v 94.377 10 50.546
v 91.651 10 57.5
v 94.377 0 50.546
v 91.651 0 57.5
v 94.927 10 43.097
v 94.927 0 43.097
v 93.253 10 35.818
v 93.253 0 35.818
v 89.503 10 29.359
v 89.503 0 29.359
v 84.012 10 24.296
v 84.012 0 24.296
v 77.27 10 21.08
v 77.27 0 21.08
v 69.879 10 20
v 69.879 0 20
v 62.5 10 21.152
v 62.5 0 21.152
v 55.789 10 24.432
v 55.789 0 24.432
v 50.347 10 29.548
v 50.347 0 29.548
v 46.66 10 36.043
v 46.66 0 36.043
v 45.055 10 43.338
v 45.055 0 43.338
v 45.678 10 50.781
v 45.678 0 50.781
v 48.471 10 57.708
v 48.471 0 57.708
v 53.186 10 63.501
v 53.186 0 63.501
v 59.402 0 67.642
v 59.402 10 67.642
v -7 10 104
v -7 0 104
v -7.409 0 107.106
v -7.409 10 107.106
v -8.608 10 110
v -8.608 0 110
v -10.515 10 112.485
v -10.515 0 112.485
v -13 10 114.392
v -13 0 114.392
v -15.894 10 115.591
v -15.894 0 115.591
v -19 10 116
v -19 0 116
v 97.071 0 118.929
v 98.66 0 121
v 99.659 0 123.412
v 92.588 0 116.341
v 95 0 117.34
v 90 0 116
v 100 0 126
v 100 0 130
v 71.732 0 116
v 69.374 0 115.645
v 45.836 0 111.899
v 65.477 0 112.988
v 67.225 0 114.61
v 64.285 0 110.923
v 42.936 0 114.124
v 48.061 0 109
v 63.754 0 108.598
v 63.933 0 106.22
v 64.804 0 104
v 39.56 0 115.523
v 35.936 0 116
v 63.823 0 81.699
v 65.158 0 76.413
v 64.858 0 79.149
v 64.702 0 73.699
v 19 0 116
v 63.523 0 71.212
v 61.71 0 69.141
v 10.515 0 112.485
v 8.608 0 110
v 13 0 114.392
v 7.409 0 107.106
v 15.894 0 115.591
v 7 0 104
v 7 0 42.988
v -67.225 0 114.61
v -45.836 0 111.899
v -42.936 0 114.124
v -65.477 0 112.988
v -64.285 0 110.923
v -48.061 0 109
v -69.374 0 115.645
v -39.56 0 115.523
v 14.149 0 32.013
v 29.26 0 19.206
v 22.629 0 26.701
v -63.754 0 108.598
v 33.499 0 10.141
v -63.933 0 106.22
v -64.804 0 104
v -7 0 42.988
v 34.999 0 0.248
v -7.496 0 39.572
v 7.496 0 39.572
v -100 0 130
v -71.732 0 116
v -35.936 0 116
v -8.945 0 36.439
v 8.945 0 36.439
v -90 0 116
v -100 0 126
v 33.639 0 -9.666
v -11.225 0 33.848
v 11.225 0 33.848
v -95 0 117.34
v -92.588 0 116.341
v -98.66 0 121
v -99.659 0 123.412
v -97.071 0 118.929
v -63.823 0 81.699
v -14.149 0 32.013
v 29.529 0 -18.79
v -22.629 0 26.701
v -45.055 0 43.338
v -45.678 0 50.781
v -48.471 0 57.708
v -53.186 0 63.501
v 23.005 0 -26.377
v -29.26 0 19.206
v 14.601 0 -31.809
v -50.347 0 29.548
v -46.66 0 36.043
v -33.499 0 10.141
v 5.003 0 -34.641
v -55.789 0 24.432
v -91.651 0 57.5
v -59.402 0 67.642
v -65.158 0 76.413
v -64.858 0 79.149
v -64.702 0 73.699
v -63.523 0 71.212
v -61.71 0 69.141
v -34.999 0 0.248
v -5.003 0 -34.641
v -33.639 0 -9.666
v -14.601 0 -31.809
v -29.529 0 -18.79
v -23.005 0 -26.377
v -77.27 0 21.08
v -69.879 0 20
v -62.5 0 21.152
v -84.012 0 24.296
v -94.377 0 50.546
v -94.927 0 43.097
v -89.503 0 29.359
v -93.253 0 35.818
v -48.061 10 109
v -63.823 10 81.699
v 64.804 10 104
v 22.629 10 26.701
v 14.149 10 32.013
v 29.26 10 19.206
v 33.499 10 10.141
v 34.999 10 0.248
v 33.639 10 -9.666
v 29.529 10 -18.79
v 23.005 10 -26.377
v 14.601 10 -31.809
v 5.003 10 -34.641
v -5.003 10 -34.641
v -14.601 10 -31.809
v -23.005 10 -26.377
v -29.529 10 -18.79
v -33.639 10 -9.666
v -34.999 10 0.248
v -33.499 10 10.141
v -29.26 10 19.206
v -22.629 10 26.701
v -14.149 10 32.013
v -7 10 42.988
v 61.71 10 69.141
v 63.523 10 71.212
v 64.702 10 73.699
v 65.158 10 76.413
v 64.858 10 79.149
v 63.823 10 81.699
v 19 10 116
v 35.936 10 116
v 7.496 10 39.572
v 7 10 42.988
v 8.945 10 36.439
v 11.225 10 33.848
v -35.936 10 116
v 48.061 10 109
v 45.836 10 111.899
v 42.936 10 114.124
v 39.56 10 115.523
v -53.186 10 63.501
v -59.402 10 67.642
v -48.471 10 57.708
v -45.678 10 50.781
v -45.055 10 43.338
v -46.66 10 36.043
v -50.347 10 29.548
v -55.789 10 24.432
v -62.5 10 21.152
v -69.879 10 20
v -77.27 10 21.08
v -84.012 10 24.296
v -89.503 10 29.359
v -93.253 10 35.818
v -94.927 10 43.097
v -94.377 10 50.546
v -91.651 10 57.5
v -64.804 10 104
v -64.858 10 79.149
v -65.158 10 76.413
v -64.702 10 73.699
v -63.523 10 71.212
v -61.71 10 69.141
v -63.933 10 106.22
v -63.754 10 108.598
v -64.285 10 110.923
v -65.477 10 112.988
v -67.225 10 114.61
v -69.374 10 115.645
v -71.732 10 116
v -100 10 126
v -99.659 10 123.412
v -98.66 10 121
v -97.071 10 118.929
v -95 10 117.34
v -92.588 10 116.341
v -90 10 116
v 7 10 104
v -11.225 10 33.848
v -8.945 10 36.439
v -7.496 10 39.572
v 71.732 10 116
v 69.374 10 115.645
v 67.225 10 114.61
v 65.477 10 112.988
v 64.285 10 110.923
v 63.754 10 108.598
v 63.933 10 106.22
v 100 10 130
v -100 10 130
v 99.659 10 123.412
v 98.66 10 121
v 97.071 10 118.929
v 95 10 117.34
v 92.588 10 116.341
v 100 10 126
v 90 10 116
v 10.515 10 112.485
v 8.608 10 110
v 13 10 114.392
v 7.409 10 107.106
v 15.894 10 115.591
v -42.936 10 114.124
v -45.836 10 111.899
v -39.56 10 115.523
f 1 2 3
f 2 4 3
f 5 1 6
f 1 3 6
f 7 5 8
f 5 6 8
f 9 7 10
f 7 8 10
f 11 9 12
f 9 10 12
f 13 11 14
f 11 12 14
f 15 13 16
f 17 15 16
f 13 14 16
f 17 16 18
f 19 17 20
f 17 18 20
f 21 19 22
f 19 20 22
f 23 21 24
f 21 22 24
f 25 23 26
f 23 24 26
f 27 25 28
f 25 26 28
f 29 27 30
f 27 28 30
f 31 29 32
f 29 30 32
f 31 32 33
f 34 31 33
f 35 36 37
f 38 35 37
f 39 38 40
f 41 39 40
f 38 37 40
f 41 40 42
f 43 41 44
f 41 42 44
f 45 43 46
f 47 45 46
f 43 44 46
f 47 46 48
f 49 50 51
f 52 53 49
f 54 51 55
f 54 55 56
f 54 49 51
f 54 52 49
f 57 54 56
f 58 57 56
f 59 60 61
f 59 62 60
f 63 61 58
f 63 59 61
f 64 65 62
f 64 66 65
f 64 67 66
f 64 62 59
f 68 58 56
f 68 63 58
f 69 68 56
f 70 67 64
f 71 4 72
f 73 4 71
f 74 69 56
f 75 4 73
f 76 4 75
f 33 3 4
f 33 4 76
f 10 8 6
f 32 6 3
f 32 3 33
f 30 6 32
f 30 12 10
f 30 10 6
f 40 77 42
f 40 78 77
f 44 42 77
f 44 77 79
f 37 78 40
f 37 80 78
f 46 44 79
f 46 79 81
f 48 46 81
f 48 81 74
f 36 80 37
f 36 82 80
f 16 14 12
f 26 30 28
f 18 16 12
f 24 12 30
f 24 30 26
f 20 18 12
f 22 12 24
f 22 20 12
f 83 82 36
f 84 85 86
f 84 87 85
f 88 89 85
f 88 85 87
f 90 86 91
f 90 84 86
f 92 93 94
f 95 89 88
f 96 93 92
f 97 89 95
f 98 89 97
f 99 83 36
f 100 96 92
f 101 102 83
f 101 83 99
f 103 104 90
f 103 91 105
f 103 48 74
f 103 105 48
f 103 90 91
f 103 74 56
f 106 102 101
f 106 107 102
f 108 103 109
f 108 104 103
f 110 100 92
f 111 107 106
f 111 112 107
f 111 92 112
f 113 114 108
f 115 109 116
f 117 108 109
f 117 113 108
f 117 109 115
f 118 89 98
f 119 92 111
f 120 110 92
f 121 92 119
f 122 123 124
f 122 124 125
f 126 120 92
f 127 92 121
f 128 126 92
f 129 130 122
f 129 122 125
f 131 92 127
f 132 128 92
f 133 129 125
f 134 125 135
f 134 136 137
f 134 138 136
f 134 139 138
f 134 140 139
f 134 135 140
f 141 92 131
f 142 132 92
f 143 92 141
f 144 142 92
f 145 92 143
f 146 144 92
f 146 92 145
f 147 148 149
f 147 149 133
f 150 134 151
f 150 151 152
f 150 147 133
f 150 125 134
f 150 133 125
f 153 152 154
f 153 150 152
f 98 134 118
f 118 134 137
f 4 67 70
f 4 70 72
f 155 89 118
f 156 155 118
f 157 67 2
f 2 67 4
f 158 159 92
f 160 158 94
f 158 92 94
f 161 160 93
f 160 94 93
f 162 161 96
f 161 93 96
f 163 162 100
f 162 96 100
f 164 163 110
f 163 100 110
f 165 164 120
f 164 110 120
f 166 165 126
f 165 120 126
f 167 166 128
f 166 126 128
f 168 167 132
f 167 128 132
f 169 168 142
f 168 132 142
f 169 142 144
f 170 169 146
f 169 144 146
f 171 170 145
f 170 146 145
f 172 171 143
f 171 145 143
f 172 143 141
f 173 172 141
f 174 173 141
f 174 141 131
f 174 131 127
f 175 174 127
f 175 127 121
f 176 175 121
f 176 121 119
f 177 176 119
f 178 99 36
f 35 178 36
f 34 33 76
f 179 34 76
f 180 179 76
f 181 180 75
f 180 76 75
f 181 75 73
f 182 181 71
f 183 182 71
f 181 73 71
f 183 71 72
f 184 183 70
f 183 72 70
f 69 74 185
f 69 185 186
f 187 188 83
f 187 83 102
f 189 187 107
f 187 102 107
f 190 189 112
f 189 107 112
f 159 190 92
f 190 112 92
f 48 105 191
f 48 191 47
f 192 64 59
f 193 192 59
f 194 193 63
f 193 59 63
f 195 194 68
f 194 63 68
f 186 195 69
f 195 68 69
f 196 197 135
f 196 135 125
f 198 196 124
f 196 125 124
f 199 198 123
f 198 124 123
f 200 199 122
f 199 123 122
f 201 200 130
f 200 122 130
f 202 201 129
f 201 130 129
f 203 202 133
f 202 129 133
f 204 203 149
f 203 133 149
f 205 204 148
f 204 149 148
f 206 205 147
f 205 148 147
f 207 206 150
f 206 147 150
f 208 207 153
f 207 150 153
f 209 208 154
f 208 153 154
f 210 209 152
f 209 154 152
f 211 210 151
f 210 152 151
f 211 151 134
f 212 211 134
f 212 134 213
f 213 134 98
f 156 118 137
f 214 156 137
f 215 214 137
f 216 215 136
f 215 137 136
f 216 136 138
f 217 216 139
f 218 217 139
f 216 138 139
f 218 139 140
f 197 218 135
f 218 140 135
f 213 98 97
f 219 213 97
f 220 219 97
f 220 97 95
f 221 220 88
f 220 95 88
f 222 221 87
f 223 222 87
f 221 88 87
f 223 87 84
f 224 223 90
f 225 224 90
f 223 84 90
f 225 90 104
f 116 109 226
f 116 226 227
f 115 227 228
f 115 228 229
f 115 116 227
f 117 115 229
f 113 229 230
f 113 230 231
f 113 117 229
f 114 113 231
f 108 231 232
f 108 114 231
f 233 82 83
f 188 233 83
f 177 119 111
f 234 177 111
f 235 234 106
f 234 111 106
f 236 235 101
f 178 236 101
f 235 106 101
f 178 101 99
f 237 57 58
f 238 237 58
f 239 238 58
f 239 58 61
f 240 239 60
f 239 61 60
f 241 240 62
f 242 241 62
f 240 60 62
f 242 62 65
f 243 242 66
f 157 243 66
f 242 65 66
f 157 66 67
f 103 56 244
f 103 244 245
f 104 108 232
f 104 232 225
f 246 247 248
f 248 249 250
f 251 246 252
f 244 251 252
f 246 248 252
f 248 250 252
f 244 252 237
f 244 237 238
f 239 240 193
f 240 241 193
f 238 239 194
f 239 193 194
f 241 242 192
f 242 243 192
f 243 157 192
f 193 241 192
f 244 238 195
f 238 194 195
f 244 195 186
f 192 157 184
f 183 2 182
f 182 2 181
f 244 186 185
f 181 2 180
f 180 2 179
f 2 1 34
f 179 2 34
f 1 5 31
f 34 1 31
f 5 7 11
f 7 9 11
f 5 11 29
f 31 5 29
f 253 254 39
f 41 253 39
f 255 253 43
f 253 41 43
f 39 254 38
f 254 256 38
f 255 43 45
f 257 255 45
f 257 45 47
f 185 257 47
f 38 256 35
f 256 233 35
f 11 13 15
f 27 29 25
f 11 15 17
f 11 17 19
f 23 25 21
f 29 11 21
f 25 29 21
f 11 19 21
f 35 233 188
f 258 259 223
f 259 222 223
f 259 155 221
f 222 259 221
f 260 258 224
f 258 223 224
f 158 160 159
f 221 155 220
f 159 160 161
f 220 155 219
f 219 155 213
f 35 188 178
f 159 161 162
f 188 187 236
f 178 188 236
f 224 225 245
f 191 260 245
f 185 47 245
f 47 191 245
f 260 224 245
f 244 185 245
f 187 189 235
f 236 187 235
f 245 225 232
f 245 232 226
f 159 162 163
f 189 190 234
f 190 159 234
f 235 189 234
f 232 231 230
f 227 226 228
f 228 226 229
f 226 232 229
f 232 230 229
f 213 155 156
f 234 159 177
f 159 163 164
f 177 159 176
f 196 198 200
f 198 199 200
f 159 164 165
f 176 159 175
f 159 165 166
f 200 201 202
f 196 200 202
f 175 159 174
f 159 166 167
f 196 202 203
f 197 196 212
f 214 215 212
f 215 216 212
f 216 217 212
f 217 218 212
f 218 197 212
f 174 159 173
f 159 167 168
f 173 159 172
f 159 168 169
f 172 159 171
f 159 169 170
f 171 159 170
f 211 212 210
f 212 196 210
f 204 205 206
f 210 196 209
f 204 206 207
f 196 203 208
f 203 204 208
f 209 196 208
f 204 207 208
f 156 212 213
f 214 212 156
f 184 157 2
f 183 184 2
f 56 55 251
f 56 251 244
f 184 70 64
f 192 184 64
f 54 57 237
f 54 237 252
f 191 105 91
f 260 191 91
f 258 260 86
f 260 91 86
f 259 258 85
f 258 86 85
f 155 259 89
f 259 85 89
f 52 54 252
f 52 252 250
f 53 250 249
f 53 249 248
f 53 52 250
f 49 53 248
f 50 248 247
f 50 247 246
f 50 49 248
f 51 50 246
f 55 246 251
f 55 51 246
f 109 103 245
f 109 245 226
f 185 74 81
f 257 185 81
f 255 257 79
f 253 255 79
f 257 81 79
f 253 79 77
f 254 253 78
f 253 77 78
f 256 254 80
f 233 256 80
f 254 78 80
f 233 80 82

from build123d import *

# Parameters (mm, degrees)
SKETCH_201_R    = 35
EXTRUDE_1_DEPTH = 10
SKETCH_7_R      = 25
EXTRUDE_2_DEPTH = 10
SKETCH_8_R      = 25
EXTRUDE_3_DEPTH = 10
EXTRUDE_4_DEPTH = 10
EXTRUDE_8_DEPTH = 10


with BuildPart() as part:
    # Sketch 201 → Бобышка-Вытянуть1 (new body)
    with BuildSketch(Plane(origin=(0, 0, 0), x_dir=(1, 0, 0), z_dir=(0, 1, 0))):
        Circle(SKETCH_201_R)
    extrude(amount=EXTRUDE_1_DEPTH)



with BuildPart() as body_2:
    # Эскиз<7> → Бобышка-Вытянуть2 (new body)
    with BuildSketch(Plane(origin=(0, 0, 0), x_dir=(1, 0, 0), z_dir=(0, 1, 0))):
        with Locations((-70, -45)):
            Circle(SKETCH_7_R)
    extrude(amount=EXTRUDE_2_DEPTH)


with BuildPart() as body_3:
    # Эскиз<8> → Бобышка-Вытянуть3 (new body)
    with BuildSketch(Plane(origin=(0, 0, 0), x_dir=(1, 0, 0), z_dir=(0, 1, 0))):
        with Locations((70, -45)):
            Circle(SKETCH_8_R)
    extrude(amount=EXTRUDE_3_DEPTH)


with BuildPart() as body_4:
    # Эскиз<9> → Бобышка-Вытянуть4 (new body)
    with BuildSketch(Plane(origin=(0, 0, 0), x_dir=(1, 0, 0), z_dir=(0, 1, 0))):
        with BuildLine():
            Line((-90, -116), (90, -116))
            ThreePointArc((90, -116), (97.071067812, -118.928932188), (100, -126))
            Line((100, -126), (100, -130))
            Line((100, -130), (-100, -130))
            Line((-100, -130), (-100, -126))
            ThreePointArc((-100, -126), (-97.071067812, -118.928932188), (-90, -116))
        make_face()
    extrude(amount=EXTRUDE_4_DEPTH)


with BuildPart() as part_1:
    add(part.part)

    add(body_2.part)  # Бобышка-Вытянуть8 merges body 2

    add(body_3.part)  # Бобышка-Вытянуть8 merges body 3

    add(body_4.part)  # Бобышка-Вытянуть8 merges body 4
    # Эскиз<21> → Бобышка-Вытянуть8 (add)
    with BuildSketch(Plane(origin=(0, 0, 0), x_dir=(1, 0, 0), z_dir=(0, 1, 0))):
        with BuildLine():
            Line((-71.732050808, -116), (-35.936334118, -116))
            ThreePointArc((-35.936334118, -116), (-42.936334118, -114.124355653), (-48.060689771, -109))
            Line((-48.060689771, -109), (-63.822734475, -81.699337741))
            ThreePointArc((-63.822734475, -81.699337741), (-64.701822863, -73.699180065), (-59.401771741, -67.642384101))
            ThreePointArc((-59.401771741, -67.642384101), (-77.500394191, -68.848356064), (-91.650635095, -57.5))
            Line((-91.650635095, -57.5), (-64.803847577, -104))
            ThreePointArc((-64.803847577, -104), (-64.803847577, -112), (-71.732050808, -116))
        make_face()
        with BuildLine():
            Line((7, -104), (7, -42.98837052))
            ThreePointArc((7, -42.98837052), (8.944833021, -36.439048645), (14.14893617, -32.012616345))
            ThreePointArc((14.14893617, -32.012616345), (0, -35), (-14.14893617, -32.012616345))
            ThreePointArc((-14.14893617, -32.012616345), (-8.944833021, -36.439048645), (-7, -42.98837052))
            Line((-7, -42.98837052), (-7, -104))
            ThreePointArc((-7, -104), (-10.514718626, -112.485281374), (-19, -116))
            Line((-19, -116), (19, -116))
            ThreePointArc((19, -116), (10.514718626, -112.485281374), (7, -104))
        make_face()
        with BuildLine():
            ThreePointArc((48.060689771, -109), (42.936334118, -114.124355653), (35.936334118, -116))
            Line((35.936334118, -116), (71.732050808, -116))
            ThreePointArc((71.732050808, -116), (64.803847577, -112), (64.803847577, -104))
            Line((64.803847577, -104), (91.650635095, -57.5))
            ThreePointArc((91.650635095, -57.5), (77.500394191, -68.848356064), (59.401771741, -67.642384101))
            ThreePointArc((59.401771741, -67.642384101), (64.701822863, -73.699180065), (63.822734475, -81.699337741))
            Line((63.822734475, -81.699337741), (48.060689771, -109))
        make_face()
    extrude(amount=EXTRUDE_8_DEPTH)


solid = part_1.part
